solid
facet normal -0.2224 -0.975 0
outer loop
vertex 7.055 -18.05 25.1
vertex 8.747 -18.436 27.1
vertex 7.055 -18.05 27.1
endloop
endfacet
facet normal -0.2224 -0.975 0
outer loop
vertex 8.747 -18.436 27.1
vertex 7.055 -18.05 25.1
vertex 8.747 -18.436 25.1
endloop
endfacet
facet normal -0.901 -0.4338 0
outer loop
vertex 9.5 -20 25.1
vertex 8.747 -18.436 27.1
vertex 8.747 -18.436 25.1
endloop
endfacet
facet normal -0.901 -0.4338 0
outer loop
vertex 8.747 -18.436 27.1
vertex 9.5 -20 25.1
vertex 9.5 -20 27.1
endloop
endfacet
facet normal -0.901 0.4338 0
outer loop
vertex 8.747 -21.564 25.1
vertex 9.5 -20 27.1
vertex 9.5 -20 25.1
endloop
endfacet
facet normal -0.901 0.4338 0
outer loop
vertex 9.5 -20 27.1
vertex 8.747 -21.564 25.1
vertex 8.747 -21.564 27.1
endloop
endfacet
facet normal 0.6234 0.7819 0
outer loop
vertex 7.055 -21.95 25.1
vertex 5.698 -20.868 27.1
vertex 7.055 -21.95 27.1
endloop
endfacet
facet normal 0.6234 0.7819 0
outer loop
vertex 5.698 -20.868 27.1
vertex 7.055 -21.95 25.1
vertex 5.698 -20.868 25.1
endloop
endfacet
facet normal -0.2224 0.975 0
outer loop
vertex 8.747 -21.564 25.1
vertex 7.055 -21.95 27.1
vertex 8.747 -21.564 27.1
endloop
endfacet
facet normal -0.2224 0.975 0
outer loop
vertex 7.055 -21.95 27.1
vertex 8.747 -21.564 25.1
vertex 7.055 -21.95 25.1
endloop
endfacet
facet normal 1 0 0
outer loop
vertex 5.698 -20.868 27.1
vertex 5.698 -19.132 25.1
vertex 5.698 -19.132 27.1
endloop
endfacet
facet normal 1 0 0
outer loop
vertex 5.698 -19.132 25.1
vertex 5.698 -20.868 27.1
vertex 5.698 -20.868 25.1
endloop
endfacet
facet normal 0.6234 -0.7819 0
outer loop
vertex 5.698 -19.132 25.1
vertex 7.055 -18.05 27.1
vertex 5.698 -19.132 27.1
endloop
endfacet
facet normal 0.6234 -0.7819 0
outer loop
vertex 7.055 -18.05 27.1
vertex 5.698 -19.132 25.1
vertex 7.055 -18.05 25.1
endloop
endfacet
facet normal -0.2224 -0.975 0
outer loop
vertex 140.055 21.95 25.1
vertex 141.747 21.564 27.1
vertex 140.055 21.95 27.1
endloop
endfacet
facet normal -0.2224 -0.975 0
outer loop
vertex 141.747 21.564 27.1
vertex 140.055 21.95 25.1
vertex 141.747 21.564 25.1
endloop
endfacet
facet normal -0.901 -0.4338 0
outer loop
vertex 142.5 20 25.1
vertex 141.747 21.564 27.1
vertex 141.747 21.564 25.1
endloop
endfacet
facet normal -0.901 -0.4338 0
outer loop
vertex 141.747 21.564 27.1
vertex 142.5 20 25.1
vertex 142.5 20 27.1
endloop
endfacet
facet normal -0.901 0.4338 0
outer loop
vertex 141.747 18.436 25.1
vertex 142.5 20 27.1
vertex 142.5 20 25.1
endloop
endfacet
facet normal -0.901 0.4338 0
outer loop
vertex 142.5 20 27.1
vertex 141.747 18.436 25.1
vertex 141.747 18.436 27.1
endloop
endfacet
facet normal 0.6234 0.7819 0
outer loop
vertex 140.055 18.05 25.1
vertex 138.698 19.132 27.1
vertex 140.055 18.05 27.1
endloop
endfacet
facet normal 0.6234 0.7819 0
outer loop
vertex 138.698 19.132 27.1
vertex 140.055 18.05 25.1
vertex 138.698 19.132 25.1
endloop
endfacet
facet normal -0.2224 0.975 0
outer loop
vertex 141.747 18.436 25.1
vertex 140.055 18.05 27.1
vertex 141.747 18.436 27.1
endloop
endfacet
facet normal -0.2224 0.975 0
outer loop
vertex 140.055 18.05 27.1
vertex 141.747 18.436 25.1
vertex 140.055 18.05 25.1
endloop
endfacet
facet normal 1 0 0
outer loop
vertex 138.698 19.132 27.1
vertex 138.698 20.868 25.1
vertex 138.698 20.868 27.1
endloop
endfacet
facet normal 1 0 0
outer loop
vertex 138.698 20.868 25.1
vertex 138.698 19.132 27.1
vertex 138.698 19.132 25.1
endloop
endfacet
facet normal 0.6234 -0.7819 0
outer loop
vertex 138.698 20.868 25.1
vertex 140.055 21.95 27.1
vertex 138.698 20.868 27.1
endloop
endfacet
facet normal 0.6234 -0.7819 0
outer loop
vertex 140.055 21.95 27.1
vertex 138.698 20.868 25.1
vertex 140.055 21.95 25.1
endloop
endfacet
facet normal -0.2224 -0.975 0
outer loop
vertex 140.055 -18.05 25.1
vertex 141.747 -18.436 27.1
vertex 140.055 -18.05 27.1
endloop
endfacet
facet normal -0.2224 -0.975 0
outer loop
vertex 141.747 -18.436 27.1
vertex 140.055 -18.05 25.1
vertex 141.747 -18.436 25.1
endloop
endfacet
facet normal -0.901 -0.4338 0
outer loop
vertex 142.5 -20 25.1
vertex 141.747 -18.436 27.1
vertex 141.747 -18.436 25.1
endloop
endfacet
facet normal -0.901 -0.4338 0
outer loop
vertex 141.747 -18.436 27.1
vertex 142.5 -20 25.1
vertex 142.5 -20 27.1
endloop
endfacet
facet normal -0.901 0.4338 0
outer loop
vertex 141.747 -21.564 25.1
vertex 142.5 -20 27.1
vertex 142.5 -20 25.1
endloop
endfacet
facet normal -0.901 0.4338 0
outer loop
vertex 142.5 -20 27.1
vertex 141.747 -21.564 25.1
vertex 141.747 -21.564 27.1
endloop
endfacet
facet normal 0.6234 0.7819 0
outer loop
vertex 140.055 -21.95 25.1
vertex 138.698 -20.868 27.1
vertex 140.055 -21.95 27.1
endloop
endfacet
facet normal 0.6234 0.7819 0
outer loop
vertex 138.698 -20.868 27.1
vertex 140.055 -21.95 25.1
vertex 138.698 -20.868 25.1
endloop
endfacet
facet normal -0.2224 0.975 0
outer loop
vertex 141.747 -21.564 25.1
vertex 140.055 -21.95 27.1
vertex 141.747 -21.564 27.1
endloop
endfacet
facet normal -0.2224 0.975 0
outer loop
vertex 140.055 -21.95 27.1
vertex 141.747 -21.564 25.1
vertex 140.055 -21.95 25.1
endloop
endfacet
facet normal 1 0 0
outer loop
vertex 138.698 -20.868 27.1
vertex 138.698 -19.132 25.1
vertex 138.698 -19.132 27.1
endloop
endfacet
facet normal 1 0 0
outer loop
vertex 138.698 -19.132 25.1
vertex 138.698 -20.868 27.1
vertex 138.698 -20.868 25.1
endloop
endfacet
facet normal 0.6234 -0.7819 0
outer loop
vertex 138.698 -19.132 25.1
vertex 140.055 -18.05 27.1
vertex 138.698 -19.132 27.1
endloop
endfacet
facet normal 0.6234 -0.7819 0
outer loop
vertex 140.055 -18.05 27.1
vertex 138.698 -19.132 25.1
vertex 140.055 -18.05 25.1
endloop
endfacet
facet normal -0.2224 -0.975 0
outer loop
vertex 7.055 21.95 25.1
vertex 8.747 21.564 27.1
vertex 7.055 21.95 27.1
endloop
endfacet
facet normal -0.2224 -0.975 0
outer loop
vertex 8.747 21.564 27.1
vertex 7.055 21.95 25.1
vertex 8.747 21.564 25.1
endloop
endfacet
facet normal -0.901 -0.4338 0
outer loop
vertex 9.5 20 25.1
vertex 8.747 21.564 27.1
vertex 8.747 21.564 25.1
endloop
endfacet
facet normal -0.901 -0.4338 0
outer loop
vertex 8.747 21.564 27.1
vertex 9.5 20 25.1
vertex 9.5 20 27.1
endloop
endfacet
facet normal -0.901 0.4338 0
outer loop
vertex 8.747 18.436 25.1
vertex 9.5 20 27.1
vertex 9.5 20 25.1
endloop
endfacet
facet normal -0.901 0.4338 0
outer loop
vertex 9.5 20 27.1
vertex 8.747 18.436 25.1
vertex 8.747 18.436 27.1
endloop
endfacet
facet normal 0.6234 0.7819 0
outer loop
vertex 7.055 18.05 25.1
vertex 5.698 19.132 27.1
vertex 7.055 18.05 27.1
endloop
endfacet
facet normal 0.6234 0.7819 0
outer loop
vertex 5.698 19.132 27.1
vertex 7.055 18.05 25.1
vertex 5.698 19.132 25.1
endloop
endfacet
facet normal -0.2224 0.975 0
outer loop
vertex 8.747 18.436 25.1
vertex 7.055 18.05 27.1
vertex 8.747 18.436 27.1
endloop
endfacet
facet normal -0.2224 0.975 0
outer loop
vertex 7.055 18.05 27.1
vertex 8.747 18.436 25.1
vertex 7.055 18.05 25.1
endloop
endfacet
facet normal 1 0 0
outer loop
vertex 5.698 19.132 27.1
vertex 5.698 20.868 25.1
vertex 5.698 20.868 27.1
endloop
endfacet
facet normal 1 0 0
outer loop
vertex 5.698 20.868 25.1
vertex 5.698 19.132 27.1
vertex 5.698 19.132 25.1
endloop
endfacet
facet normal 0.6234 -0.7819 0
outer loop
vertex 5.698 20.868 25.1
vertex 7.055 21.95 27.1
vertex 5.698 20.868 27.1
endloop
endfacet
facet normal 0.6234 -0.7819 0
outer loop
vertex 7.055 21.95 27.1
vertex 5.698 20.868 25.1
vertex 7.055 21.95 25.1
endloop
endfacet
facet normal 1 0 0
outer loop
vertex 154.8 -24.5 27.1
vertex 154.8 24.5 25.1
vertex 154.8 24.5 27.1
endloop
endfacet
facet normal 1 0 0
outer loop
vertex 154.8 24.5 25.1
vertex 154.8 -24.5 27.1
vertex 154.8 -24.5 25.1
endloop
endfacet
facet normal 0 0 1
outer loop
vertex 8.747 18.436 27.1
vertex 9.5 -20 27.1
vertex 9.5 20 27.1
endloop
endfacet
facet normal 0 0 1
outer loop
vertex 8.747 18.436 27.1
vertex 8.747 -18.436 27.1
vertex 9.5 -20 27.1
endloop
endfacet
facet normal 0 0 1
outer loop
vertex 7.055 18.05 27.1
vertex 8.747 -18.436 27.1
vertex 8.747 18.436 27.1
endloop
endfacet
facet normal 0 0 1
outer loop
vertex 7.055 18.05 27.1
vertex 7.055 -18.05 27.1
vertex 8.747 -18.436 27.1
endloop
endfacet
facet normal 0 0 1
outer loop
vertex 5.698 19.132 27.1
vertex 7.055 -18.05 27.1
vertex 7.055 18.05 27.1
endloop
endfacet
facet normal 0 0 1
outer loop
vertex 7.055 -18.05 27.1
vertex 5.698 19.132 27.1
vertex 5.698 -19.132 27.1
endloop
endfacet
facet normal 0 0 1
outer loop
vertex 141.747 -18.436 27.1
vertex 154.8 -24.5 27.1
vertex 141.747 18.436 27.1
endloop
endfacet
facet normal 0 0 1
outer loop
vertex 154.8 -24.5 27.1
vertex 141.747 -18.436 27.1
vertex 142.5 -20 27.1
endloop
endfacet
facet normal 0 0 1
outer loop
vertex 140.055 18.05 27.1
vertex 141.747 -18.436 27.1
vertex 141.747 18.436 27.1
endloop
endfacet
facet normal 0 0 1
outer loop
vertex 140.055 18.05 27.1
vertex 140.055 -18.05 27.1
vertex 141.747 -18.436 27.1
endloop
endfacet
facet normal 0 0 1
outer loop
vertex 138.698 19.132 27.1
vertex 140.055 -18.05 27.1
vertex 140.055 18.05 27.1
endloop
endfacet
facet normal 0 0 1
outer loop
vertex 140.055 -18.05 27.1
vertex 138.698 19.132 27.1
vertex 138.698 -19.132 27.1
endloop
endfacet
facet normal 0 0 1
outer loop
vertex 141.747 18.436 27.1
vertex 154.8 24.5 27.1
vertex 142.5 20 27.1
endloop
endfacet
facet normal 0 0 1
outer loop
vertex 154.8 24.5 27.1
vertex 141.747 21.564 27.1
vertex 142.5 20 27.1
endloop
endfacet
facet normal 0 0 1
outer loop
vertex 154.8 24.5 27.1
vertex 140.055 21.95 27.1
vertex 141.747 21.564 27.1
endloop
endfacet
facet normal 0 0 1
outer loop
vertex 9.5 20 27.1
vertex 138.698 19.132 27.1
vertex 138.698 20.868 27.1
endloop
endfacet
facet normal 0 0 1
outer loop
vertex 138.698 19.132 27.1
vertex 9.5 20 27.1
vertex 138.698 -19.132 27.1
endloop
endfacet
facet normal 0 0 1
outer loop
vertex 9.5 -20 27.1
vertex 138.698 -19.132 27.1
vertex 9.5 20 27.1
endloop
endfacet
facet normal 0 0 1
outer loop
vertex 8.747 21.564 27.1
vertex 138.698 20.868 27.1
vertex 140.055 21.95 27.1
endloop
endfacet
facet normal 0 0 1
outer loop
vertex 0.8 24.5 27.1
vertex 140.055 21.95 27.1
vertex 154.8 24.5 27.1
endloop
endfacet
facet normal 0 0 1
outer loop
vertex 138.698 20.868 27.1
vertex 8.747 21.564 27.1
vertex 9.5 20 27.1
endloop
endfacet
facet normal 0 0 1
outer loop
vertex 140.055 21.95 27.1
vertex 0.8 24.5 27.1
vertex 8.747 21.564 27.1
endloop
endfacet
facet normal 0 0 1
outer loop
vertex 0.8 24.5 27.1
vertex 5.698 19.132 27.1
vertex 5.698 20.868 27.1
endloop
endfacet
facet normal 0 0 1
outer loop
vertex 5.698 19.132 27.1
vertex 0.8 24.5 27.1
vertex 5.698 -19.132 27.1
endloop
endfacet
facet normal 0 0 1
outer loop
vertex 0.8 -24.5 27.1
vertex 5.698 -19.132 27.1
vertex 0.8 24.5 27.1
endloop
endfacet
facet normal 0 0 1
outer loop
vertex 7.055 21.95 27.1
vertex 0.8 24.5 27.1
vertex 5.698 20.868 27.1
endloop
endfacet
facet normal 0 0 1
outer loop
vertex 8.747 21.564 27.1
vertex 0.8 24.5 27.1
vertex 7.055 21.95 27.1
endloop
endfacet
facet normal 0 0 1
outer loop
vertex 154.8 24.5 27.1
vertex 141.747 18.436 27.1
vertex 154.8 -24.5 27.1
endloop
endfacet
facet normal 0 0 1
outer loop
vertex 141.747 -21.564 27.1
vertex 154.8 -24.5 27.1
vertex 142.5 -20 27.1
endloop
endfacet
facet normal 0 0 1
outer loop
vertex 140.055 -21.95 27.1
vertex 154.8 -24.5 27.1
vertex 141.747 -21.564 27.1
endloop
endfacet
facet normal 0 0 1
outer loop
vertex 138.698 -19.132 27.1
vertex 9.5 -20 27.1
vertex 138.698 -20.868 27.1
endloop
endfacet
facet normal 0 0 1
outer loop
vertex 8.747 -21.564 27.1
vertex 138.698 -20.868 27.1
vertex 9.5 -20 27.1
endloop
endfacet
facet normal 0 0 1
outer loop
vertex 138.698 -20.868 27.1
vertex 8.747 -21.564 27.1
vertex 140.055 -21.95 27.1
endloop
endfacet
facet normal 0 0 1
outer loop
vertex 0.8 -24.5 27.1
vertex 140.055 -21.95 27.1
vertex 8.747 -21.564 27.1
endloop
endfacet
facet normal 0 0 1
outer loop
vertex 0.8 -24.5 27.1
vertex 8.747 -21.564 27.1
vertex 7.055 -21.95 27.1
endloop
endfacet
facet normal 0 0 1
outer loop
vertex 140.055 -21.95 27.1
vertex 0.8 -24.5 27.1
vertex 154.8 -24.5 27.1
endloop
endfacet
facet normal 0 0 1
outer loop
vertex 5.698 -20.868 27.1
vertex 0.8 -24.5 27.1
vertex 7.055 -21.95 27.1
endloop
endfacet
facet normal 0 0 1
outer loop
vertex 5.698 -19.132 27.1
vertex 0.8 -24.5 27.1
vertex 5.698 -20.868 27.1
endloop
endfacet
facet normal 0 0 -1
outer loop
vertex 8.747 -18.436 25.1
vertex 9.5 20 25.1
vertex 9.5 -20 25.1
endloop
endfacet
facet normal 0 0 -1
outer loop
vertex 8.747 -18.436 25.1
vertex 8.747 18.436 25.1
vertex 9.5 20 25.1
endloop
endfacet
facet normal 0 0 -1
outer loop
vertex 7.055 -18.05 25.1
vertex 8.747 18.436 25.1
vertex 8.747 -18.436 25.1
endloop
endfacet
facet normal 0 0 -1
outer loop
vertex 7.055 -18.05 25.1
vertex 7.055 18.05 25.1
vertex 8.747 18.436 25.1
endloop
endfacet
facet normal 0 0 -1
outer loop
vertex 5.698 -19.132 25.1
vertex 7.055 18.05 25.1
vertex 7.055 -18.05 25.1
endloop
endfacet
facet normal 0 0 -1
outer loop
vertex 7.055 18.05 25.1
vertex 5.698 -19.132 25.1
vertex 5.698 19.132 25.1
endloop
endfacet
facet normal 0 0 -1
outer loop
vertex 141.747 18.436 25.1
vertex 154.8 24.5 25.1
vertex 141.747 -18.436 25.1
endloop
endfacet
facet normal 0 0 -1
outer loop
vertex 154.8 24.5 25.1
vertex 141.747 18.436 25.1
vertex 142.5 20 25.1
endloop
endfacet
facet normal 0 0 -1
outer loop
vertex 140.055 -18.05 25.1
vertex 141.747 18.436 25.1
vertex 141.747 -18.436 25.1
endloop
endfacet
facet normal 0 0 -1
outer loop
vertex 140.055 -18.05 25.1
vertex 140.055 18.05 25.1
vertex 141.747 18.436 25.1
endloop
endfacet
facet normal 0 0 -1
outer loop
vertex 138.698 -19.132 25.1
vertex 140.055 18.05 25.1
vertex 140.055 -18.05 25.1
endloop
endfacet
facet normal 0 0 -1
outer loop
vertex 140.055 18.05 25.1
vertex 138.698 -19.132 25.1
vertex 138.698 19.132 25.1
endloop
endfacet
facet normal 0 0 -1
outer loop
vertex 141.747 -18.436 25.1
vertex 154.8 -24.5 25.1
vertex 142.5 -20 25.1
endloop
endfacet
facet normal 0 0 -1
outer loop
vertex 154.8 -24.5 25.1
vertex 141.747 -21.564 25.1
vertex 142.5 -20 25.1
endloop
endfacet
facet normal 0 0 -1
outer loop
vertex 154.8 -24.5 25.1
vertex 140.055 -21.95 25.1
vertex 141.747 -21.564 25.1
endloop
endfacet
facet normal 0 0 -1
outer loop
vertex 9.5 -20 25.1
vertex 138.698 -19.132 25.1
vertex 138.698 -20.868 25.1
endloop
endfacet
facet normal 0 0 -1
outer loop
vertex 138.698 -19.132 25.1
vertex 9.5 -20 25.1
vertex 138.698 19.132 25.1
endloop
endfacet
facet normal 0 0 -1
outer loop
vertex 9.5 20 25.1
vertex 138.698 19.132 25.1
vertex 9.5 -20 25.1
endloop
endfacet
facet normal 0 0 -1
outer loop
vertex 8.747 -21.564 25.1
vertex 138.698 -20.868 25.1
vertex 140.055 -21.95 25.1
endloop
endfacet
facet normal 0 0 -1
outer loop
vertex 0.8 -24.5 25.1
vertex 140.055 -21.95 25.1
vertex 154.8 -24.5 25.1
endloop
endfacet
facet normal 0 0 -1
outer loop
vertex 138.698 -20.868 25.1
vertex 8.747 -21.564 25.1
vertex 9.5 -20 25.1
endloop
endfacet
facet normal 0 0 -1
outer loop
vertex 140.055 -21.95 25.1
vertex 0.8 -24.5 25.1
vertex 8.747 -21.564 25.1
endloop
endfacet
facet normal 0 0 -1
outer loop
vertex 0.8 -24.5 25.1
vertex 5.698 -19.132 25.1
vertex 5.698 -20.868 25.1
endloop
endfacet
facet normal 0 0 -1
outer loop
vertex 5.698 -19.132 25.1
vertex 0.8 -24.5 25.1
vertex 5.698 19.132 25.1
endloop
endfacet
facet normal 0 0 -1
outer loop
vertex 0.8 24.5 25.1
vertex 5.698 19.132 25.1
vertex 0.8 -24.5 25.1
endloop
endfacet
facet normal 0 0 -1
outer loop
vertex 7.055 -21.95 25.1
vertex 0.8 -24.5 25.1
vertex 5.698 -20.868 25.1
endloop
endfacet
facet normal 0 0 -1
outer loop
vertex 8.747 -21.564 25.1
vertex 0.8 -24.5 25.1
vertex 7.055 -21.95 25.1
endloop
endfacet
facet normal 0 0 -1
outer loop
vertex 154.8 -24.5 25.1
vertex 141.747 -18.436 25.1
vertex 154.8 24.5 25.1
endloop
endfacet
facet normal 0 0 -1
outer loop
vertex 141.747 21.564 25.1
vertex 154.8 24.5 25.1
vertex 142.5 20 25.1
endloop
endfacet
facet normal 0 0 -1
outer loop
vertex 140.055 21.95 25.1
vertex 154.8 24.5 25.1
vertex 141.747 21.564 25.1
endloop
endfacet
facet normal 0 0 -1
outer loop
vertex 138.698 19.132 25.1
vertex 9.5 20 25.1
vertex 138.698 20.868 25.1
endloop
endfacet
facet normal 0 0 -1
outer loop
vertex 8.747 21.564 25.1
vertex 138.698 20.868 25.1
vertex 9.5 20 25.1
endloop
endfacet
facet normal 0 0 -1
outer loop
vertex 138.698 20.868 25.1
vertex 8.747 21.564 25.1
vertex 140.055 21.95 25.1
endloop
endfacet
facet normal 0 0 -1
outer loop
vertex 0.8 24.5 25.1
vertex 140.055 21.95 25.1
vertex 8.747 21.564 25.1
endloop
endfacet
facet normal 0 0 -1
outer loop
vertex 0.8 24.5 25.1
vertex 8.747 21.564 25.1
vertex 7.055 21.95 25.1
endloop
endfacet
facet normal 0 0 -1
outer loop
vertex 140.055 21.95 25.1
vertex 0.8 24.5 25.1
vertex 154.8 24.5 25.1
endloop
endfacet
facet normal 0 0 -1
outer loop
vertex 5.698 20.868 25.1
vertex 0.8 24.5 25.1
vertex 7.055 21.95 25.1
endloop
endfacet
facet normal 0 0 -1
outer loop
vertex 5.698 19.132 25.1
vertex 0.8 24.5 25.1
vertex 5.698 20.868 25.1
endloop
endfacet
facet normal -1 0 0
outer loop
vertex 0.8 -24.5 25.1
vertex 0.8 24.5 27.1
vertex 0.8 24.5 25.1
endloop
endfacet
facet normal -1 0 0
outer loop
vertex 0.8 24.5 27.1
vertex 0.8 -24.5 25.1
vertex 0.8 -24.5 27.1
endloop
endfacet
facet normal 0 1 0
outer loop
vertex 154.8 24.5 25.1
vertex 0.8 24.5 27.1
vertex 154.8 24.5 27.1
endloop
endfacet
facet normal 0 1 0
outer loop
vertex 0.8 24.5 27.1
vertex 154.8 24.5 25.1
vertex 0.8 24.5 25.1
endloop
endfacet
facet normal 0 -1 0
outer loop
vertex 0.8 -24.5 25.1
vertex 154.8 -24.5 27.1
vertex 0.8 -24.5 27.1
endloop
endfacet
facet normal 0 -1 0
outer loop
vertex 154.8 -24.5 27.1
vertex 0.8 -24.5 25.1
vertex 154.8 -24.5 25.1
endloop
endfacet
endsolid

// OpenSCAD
module cover(){
difference(){
translate([5-2.2-2,5-58/2-0.5,25.1])
cube([154,49,2]);
cover_holes();
}
}


module cover_holes(){
translate([7.5,5-58/2+4,20])
cylinder(r=2,h=15);
translate([7.5-12+140+5,-5-58/2-4+58,20])
cylinder(r=2,h=15);
translate([7.5-12+140+5,5-58/2+4,20])
cylinder(r=2,h=15);
translate([7.5,-5-58/2-4+58,20])
cylinder(r=2,h=15);
}




cover();
//cover_holes();
